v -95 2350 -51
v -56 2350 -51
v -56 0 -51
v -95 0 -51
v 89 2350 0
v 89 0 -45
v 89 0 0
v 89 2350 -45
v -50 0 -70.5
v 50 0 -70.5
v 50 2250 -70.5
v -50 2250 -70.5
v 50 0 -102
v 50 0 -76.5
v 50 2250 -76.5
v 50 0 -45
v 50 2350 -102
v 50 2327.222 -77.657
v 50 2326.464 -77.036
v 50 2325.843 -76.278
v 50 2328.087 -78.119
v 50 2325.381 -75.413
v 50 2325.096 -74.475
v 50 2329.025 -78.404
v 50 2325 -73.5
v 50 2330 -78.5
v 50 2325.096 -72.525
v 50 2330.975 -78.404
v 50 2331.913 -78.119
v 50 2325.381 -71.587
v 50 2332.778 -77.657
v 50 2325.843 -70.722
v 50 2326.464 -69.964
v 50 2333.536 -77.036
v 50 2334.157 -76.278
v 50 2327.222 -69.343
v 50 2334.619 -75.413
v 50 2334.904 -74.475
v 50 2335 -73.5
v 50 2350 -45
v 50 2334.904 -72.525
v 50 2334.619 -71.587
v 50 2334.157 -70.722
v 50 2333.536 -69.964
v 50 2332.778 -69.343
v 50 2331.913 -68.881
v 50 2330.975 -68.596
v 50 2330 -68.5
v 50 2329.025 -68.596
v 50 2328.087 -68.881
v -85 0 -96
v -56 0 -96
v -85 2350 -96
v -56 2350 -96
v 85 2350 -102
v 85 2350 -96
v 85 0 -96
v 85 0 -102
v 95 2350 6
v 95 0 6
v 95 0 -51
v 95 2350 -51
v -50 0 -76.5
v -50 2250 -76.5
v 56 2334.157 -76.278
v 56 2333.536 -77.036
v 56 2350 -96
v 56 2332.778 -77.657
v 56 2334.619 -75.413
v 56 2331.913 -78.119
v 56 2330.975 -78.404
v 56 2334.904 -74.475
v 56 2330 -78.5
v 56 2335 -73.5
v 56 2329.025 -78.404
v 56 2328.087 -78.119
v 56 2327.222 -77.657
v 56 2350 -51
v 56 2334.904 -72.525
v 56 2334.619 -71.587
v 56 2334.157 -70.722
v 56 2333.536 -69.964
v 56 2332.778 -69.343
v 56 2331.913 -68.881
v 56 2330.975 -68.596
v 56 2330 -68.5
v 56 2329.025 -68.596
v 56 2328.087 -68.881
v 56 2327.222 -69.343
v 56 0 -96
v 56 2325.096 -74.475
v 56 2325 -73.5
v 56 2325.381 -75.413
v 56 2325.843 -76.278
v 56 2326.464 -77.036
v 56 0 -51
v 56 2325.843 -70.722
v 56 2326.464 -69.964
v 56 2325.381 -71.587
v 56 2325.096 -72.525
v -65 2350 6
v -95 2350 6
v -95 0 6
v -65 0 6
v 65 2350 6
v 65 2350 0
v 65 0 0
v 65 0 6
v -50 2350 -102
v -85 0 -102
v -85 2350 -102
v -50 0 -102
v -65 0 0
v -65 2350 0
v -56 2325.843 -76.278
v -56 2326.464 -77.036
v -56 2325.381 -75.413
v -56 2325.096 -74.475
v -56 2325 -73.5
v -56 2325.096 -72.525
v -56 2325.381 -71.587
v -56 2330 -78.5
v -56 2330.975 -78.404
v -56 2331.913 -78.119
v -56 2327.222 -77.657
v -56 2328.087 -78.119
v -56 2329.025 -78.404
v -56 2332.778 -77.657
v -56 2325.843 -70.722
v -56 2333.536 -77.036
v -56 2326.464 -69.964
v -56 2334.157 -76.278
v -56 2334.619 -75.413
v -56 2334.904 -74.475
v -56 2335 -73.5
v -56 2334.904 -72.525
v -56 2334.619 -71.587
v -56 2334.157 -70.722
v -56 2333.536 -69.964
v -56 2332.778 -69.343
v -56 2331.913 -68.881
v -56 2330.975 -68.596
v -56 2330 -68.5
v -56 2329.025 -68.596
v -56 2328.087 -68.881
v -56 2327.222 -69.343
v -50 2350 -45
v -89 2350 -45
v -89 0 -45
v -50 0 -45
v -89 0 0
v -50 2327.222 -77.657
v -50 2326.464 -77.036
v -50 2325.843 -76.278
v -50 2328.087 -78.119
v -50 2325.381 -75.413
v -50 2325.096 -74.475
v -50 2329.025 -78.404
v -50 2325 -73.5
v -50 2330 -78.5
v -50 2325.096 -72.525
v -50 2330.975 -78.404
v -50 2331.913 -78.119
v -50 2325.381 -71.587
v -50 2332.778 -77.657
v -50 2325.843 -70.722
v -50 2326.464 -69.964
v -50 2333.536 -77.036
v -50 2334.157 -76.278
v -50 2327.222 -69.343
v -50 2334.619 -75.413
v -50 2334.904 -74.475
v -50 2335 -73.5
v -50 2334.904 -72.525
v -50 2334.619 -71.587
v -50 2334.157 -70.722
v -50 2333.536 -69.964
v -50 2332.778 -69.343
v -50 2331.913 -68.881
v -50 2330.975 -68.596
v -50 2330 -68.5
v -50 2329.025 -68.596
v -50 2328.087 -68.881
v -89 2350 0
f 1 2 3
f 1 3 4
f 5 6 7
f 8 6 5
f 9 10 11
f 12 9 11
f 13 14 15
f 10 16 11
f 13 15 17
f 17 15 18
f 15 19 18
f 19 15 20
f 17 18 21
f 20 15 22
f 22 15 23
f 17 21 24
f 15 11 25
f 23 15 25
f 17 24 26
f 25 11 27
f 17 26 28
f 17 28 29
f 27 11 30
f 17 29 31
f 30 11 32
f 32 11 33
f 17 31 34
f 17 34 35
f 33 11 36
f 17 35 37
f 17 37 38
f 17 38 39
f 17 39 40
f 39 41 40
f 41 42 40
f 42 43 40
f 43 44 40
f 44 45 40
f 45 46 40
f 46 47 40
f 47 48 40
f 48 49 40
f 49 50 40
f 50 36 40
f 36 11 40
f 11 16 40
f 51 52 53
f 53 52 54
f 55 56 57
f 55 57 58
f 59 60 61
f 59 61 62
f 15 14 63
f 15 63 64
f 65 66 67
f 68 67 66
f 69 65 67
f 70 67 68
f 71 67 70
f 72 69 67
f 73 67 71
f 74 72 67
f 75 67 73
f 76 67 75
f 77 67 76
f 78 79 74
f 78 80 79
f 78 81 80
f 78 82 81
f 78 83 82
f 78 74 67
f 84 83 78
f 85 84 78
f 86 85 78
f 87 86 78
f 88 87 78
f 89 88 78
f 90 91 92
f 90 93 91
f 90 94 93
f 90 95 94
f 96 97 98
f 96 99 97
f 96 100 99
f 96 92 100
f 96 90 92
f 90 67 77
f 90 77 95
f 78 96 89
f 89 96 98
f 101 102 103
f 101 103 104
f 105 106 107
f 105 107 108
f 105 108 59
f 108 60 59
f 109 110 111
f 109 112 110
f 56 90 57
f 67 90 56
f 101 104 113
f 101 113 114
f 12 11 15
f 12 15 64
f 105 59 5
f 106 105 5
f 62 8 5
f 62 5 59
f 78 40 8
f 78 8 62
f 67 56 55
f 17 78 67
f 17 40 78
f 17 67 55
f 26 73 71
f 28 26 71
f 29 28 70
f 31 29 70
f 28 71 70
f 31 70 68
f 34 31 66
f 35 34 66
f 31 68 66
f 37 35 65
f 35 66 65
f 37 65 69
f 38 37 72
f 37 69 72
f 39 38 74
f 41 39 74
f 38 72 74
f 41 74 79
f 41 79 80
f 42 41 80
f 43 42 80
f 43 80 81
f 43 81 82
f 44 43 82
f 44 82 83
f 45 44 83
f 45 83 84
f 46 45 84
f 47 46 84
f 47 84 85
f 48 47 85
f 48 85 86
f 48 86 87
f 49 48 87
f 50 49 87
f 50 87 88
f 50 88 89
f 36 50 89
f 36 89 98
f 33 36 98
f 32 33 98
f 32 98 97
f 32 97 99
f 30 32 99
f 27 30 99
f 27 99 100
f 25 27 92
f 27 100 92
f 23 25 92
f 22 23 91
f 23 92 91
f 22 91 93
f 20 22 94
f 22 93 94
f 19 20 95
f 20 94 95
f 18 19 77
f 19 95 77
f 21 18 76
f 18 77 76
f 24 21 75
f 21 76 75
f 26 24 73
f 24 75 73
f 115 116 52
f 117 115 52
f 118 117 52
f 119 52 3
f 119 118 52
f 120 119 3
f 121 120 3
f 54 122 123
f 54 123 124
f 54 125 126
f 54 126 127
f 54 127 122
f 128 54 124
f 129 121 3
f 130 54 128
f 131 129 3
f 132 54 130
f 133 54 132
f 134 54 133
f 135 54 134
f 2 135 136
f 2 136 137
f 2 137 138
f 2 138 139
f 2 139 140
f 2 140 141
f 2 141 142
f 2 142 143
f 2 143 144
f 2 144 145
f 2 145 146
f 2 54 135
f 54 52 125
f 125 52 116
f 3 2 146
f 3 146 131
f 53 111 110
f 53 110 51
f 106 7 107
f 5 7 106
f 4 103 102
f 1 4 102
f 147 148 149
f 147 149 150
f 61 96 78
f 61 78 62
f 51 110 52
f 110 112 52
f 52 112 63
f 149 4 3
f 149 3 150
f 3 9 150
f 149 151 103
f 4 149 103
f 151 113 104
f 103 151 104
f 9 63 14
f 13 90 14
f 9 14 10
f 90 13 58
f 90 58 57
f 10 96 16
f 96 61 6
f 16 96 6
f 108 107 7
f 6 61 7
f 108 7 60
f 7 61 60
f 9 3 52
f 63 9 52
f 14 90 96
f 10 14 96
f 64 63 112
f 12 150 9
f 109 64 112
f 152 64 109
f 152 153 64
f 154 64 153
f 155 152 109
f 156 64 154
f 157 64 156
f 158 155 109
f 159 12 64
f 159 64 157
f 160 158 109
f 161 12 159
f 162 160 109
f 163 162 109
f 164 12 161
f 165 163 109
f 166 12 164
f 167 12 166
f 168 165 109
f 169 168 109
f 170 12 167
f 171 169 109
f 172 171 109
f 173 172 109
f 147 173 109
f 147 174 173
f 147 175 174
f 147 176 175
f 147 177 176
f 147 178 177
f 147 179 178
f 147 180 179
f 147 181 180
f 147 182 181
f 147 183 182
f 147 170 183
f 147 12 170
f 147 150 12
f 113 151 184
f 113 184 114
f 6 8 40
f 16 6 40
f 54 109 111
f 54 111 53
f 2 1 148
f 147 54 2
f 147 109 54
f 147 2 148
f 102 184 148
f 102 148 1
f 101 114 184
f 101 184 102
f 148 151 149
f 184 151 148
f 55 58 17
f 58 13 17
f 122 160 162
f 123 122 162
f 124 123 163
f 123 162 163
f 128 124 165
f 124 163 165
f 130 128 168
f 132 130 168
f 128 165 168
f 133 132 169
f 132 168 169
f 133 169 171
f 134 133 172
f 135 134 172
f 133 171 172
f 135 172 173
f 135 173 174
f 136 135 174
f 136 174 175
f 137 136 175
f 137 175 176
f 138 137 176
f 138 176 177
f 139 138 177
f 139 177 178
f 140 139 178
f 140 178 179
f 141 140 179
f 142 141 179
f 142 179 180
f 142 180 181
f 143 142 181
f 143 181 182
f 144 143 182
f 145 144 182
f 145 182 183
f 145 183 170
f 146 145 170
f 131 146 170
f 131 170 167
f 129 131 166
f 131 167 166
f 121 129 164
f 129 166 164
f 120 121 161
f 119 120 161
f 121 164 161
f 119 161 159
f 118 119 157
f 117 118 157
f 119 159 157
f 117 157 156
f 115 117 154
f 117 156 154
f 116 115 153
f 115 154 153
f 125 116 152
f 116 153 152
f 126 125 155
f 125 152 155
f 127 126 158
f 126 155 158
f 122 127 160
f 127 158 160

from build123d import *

# Parameters (mm, degrees)
SKETCH1_W                      = 45
SKETCH1_H                      = 2350
BOSS_EXTRUDE1_DEPTH            = 31.5
SKETCH2_W                      = 6
SKETCH2_H                      = 2350
BOSS_EXTRUDE2_DEPTH            = 145
SKETCH3_W                      = 45
SKETCH3_H                      = 2350
BOSS_EXTRUDE3_DEPTH            = 76.5
SKETCH4_W                      = 6
SKETCH4_H                      = 2350
BOSS_EXTRUDE4_DEPTH            = 51
SKETCH5_W                      = 6
SKETCH5_H                      = 2350
BOSS_EXTRUDE5_DEPTH            = 24
SKETCH6_W                      = 15
SKETCH6_H                      = 2350
CUT_EXTRUDE1_DEPTH             = 6
SKETCH7_W                      = 39
SKETCH7_H                      = 2350
CUT_EXTRUDE2_DEPTH             = 45
SKETCH8_W                      = 100
SKETCH8_H                      = 6
CUT_EXTRUDE3_DEPTH             = 100
SKETCH9_W                      = 45
SKETCH9_H                      = 2350
BOSS_EXTRUDE6_DEPTH            = 25.5
SKETCH10_W                     = 39
SKETCH10_H                     = 51
CUT_EXTRUDE4_DEPTH             = 2351
SKETCH11_W                     = 6
SKETCH11_H                     = 2350
BOSS_EXTRUDE7_DEPTH            = 29
SKETCH12_W                     = 45
SKETCH12_H                     = 2350
BOSS_EXTRUDE8_DEPTH            = 25.5
SKETCH13_W                     = 39
SKETCH13_H                     = 51
CUT_EXTRUDE5_DEPTH             = 2351
SKETCH14_W                     = 6
SKETCH14_H                     = 2350
BOSS_EXTRUDE9_DEPTH            = 29
F_10_0_10_DIAMETER_HOLE1_D     = 10
F_10_0_10_DIAMETER_HOLE1_DEPTH = 6
F_10_0_10_DIAMETER_HOLE2_D     = 10
F_10_0_10_DIAMETER_HOLE2_DEPTH = 45


with BuildPart() as part:
    # Sketch1 → Boss-Extrude1 (new body)
    with BuildSketch(Plane(origin=(0, 0, -76.5), x_dir=(-1, 0, 0), z_dir=(0, 0, -1))):
        with Locations((-72.5, 1175)):
            Rectangle(SKETCH1_W, SKETCH1_H)
    extrude(amount=-BOSS_EXTRUDE1_DEPTH)

    # Sketch2 → Boss-Extrude2 (add)
    with BuildSketch(Plane.ZY.offset(-50)):
        with Locations((-73.5, 1175)):
            Rectangle(SKETCH2_W, SKETCH2_H)
    extrude(amount=BOSS_EXTRUDE2_DEPTH)

    # Sketch3 → Boss-Extrude3 (add)
    with BuildSketch(Plane.XY.offset(-70.5)):
        with Locations((-72.5, 1175)):
            Rectangle(SKETCH3_W, SKETCH3_H)
    extrude(amount=BOSS_EXTRUDE3_DEPTH)

    # Sketch4 → Boss-Extrude4 (add)
    with BuildSketch(Plane.XY.offset(-45)):
        with Locations((92, 1175)):
            Rectangle(SKETCH4_W, SKETCH4_H)
    extrude(amount=BOSS_EXTRUDE4_DEPTH)

    # Sketch5 → Boss-Extrude5 (add)
    with BuildSketch(Plane.ZY.offset(-89)):
        with Locations((3, 1175)):
            Rectangle(SKETCH5_W, SKETCH5_H)
    extrude(amount=BOSS_EXTRUDE5_DEPTH)

    # Sketch6 → Cut-Extrude1 (cut)
    with BuildSketch(Plane.XY.offset(6)):
        with Locations((-57.5, 1175)):
            Rectangle(SKETCH6_W, SKETCH6_H)
    extrude(amount=-CUT_EXTRUDE1_DEPTH, mode=Mode.SUBTRACT)

    # Sketch7 → Cut-Extrude2 (cut)
    with BuildSketch(Plane.XY):
        with Locations((-69.5, 1175)):
            Rectangle(SKETCH7_W, SKETCH7_H)
    extrude(amount=-CUT_EXTRUDE2_DEPTH, mode=Mode.SUBTRACT)

    # Sketch8 → Cut-Extrude3 (cut)
    with BuildSketch(Plane(origin=(0, 2350, 0), x_dir=(-1, 0, 0), z_dir=(0, 1, 0))):
        with Locations((0, -73.5)):
            Rectangle(SKETCH8_W, SKETCH8_H)
    extrude(amount=-CUT_EXTRUDE3_DEPTH, mode=Mode.SUBTRACT)

    # Sketch9 → Boss-Extrude6 (add)
    with BuildSketch(Plane(origin=(0, 0, -76.5), x_dir=(-1, 0, 0), z_dir=(0, 0, -1))):
        with Locations((-72.5, 1175)):
            Rectangle(SKETCH9_W, SKETCH9_H)
    extrude(amount=BOSS_EXTRUDE6_DEPTH)

    # Sketch10 → Cut-Extrude4 (cut, through all)
    with BuildSketch(Plane.XZ):
        with Locations((75.5, -76.5)):
            Rectangle(SKETCH10_W, SKETCH10_H)
    extrude(amount=-CUT_EXTRUDE4_DEPTH, mode=Mode.SUBTRACT)

    # Sketch11 → Boss-Extrude7 (add)
    with BuildSketch(Plane(origin=(56, 0, 0), x_dir=(0, 0, -1), z_dir=(1, 0, 0))):
        with Locations((99, 1175)):
            Rectangle(SKETCH11_W, SKETCH11_H)
    extrude(amount=BOSS_EXTRUDE7_DEPTH)

    # Sketch12 → Boss-Extrude8 (add)
    with BuildSketch(Plane(origin=(0, 0, -76.5), x_dir=(-1, 0, 0), z_dir=(0, 0, -1))):
        with Locations((72.5, 1175)):
            Rectangle(SKETCH12_W, SKETCH12_H)
    extrude(amount=BOSS_EXTRUDE8_DEPTH)

    # Sketch13 → Cut-Extrude5 (cut, through all)
    with BuildSketch(Plane(origin=(0, 2350, 0), x_dir=(-1, 0, 0), z_dir=(0, 1, 0))):
        with Locations((75.5, -76.5)):
            Rectangle(SKETCH13_W, SKETCH13_H)
    extrude(amount=-CUT_EXTRUDE5_DEPTH, mode=Mode.SUBTRACT)

    # Sketch14 → Boss-Extrude9 (add)
    with BuildSketch(Plane.ZY.offset(56)):
        with Locations((-99, 1175)):
            Rectangle(SKETCH14_W, SKETCH14_H)
    extrude(amount=BOSS_EXTRUDE9_DEPTH)

    # Ø10.0 (10) Diameter Hole1
    with Locations(Plane.ZY.offset(56)):
        with Locations((-73.5, 2330)):
            Hole(F_10_0_10_DIAMETER_HOLE1_D / 2, depth=F_10_0_10_DIAMETER_HOLE1_DEPTH)

    # Ø10.0 (10) Diameter Hole2
    with Locations(Plane.ZY.offset(-50)):
        with Locations((-73.5, 2330)):
            Hole(F_10_0_10_DIAMETER_HOLE2_D / 2, depth=F_10_0_10_DIAMETER_HOLE2_DEPTH)


solid = part.part
